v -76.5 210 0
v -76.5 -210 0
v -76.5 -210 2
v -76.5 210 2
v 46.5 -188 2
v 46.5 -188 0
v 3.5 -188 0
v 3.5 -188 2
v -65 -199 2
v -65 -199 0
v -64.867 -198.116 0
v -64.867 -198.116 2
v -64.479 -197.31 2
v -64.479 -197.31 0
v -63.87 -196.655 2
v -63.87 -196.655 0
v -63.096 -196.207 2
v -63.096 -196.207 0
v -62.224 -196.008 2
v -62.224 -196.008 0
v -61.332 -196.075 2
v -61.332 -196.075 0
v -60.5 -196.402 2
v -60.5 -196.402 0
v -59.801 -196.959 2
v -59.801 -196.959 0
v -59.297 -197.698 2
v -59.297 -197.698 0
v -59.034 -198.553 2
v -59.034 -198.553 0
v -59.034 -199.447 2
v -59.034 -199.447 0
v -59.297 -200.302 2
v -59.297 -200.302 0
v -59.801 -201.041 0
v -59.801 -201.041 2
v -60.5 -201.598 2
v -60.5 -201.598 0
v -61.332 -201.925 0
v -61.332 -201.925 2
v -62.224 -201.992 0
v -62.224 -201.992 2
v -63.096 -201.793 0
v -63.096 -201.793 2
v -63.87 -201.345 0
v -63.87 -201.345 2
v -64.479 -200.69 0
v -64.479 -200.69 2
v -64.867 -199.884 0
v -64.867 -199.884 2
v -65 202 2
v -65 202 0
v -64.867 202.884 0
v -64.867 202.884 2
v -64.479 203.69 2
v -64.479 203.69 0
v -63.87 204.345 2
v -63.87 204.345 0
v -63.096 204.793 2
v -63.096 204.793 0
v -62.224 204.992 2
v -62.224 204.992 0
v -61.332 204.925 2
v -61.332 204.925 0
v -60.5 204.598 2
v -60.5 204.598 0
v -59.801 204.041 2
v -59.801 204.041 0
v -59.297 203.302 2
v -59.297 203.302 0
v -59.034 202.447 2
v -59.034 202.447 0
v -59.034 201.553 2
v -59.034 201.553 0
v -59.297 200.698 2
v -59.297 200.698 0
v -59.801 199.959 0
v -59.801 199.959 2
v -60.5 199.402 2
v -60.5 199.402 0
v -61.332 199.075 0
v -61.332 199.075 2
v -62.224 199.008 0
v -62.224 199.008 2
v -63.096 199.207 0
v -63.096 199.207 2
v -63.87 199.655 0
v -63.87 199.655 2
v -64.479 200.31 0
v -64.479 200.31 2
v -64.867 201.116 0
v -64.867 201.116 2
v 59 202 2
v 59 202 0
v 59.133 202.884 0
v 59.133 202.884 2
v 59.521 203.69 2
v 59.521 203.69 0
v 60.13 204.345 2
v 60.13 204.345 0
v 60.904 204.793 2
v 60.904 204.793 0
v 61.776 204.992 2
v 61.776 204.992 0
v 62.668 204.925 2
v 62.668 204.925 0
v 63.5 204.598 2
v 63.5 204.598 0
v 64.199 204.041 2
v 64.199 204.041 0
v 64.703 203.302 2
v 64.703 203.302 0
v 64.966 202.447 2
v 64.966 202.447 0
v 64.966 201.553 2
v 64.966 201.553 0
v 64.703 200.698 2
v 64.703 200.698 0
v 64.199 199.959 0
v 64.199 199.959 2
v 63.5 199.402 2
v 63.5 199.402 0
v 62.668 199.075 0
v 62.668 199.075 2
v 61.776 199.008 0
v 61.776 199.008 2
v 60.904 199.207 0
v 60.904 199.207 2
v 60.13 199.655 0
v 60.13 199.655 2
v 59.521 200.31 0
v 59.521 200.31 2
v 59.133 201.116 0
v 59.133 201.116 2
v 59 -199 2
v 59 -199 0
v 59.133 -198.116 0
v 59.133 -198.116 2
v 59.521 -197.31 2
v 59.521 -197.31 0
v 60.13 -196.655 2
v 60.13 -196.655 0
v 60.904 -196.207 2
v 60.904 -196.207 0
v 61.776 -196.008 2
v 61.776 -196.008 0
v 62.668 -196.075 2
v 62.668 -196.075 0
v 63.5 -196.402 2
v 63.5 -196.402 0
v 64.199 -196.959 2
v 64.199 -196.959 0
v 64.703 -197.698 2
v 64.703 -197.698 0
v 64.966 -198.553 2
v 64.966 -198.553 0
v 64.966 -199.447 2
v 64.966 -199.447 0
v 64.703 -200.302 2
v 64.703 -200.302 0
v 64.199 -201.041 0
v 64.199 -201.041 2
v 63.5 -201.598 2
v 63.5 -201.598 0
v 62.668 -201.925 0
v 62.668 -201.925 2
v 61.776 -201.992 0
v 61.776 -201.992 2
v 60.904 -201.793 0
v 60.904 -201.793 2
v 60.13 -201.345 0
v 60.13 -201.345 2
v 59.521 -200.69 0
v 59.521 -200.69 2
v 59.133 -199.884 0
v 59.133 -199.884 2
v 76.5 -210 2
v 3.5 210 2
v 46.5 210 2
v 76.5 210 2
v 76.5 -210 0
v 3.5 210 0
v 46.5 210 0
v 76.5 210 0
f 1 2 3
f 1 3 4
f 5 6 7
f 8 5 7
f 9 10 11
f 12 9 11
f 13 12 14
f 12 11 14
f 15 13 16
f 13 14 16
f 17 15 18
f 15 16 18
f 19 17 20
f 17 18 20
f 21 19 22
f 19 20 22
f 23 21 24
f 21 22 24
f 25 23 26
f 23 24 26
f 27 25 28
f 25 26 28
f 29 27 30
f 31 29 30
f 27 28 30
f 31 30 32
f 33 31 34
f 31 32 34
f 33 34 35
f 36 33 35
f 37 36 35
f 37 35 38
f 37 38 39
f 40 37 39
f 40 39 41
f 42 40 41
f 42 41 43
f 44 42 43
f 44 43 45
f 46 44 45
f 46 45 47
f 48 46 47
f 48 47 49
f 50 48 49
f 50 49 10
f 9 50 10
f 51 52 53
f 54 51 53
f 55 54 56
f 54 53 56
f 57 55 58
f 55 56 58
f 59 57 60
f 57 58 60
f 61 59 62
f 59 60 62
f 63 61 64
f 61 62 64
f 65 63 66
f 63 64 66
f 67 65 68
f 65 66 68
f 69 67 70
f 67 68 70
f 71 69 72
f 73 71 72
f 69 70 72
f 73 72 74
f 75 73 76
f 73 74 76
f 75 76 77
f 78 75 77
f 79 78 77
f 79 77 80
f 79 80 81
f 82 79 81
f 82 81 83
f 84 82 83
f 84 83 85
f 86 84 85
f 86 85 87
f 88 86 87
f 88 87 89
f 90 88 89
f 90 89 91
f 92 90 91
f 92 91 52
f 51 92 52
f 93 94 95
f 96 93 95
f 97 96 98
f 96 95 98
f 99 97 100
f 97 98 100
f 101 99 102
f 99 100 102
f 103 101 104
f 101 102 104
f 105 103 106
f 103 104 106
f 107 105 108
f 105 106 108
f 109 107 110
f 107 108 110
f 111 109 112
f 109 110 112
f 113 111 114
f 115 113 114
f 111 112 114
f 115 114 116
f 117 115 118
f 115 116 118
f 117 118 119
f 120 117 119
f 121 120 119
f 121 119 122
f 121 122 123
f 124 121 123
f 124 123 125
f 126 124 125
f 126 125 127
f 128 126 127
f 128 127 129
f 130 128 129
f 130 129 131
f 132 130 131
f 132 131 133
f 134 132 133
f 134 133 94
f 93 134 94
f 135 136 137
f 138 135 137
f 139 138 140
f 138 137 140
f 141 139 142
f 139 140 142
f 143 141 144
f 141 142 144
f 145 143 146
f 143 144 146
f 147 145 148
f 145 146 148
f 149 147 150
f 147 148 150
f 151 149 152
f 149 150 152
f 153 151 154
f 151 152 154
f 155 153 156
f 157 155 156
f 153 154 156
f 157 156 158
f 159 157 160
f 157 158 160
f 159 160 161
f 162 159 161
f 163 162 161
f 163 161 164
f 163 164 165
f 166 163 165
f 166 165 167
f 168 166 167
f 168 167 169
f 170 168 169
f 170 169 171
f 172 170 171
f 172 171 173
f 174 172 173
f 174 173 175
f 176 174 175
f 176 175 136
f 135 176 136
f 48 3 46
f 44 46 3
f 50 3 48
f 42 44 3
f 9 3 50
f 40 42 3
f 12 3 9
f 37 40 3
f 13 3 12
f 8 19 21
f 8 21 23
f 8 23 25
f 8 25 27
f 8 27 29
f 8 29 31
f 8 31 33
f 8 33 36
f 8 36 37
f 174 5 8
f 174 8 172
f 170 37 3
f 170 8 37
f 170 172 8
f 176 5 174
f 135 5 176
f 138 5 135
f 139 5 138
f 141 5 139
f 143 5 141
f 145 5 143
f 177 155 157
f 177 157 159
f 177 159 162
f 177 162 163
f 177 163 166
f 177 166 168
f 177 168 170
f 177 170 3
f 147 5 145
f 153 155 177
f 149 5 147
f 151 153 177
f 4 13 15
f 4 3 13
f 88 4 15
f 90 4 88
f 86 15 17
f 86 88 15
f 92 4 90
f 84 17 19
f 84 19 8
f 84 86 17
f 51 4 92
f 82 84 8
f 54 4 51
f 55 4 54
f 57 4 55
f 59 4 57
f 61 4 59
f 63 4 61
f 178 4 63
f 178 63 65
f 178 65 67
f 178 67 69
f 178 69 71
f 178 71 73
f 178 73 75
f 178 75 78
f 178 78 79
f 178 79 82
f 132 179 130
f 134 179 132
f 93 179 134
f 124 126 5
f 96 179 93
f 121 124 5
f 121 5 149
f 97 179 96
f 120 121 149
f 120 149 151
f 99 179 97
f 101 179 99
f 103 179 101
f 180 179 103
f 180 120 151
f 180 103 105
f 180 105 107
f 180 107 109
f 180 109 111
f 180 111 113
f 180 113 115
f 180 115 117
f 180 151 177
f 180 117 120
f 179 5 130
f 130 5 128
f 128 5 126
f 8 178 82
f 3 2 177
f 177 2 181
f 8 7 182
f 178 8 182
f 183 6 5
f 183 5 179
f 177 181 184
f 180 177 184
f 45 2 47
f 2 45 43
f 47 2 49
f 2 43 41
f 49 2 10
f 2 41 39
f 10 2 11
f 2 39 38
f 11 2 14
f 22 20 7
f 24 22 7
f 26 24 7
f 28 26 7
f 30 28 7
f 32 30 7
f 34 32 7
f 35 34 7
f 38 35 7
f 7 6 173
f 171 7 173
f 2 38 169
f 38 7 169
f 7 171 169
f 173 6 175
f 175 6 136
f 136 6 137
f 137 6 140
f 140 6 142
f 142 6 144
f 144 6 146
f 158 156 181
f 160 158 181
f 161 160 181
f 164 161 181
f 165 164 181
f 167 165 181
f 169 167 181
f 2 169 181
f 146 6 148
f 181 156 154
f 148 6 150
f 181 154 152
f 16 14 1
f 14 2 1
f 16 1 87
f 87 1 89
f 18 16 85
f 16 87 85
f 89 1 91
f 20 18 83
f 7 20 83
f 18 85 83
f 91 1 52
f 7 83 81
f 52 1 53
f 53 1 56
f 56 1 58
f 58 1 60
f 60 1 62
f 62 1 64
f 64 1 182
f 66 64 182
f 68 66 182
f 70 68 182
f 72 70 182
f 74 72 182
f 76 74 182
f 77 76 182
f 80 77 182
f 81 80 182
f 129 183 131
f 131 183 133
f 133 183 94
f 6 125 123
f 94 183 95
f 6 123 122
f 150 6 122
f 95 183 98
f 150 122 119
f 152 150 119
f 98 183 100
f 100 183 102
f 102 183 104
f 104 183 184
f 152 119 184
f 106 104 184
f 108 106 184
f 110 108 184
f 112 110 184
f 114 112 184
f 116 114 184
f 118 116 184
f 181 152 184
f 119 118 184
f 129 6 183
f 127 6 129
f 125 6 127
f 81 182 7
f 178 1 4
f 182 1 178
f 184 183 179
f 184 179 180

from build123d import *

# Parameters (mm, degrees)
SKETCH1_W           = 153
SKETCH1_H           = 420
BOSS_EXTRUDE1_DEPTH = 2
CUT_EXTRUDE1_REACH  = 225.509
SKETCH2_W           = 43
SKETCH2_H           = 398
CUT_EXTRUDE2_REACH  = 225.509
SKETCH3_R           = 3


with BuildPart() as part:
    # Sketch1 → Boss-Extrude1 (new body)
    with BuildSketch(Plane.XY):
        Rectangle(SKETCH1_W, SKETCH1_H)
    extrude(amount=BOSS_EXTRUDE1_DEPTH)

    # Sketch2 → Cut-Extrude1 (cut, up to next)
    with BuildSketch(Plane(origin=(0, 0, 0), x_dir=(-1, 0, 0), z_dir=(0, 0, -1)), mode=Mode.PRIVATE) as cut_extrude1_sk1:
        with Locations((-25, 11)):
            Rectangle(SKETCH2_W, SKETCH2_H)
    cut_extrude1_tool1 = extrude(cut_extrude1_sk1.sketch, amount=-CUT_EXTRUDE1_REACH, mode=Mode.PRIVATE) & part.part
    add(cut_extrude1_tool1.solids().sort_by_distance((25, 11, 0))[0], mode=Mode.SUBTRACT)

    # Sketch3 → Cut-Extrude2 (cut, up to next)
    with BuildSketch(Plane(origin=(0, 0, 0), x_dir=(-1, 0, 0), z_dir=(0, 0, -1)), mode=Mode.PRIVATE) as cut_extrude2_sk1:
        with Locations((-62, 202)):
            Circle(SKETCH3_R)
    cut_extrude2_tool1 = extrude(cut_extrude2_sk1.sketch, amount=-CUT_EXTRUDE2_REACH, mode=Mode.PRIVATE) & part.part
    # Sketch3 → Cut-Extrude2 (cut, up to next)
    with BuildSketch(Plane(origin=(0, 0, 0), x_dir=(-1, 0, 0), z_dir=(0, 0, -1)), mode=Mode.PRIVATE) as cut_extrude2_sk2:
        with Locations((-62, -199)):
            Circle(SKETCH3_R)
    cut_extrude2_tool2 = extrude(cut_extrude2_sk2.sketch, amount=-CUT_EXTRUDE2_REACH, mode=Mode.PRIVATE) & part.part
    # Sketch3 → Cut-Extrude2 (cut, up to next)
    with BuildSketch(Plane(origin=(0, 0, 0), x_dir=(-1, 0, 0), z_dir=(0, 0, -1)), mode=Mode.PRIVATE) as cut_extrude2_sk3:
        with Locations((62, 202)):
            Circle(SKETCH3_R)
    cut_extrude2_tool3 = extrude(cut_extrude2_sk3.sketch, amount=-CUT_EXTRUDE2_REACH, mode=Mode.PRIVATE) & part.part
    # Sketch3 → Cut-Extrude2 (cut, up to next)
    with BuildSketch(Plane(origin=(0, 0, 0), x_dir=(-1, 0, 0), z_dir=(0, 0, -1)), mode=Mode.PRIVATE) as cut_extrude2_sk4:
        with Locations((62, -199)):
            Circle(SKETCH3_R)
    cut_extrude2_tool4 = extrude(cut_extrude2_sk4.sketch, amount=-CUT_EXTRUDE2_REACH, mode=Mode.PRIVATE) & part.part
    add(cut_extrude2_tool1.solids().sort_by_distance((62, 202, 0))[0], mode=Mode.SUBTRACT)
    add(cut_extrude2_tool2.solids().sort_by_distance((62, -199, 0))[0], mode=Mode.SUBTRACT)
    add(cut_extrude2_tool3.solids().sort_by_distance((-62, 202, 0))[0], mode=Mode.SUBTRACT)
    add(cut_extrude2_tool4.solids().sort_by_distance((-62, -199, 0))[0], mode=Mode.SUBTRACT)


solid = part.part
